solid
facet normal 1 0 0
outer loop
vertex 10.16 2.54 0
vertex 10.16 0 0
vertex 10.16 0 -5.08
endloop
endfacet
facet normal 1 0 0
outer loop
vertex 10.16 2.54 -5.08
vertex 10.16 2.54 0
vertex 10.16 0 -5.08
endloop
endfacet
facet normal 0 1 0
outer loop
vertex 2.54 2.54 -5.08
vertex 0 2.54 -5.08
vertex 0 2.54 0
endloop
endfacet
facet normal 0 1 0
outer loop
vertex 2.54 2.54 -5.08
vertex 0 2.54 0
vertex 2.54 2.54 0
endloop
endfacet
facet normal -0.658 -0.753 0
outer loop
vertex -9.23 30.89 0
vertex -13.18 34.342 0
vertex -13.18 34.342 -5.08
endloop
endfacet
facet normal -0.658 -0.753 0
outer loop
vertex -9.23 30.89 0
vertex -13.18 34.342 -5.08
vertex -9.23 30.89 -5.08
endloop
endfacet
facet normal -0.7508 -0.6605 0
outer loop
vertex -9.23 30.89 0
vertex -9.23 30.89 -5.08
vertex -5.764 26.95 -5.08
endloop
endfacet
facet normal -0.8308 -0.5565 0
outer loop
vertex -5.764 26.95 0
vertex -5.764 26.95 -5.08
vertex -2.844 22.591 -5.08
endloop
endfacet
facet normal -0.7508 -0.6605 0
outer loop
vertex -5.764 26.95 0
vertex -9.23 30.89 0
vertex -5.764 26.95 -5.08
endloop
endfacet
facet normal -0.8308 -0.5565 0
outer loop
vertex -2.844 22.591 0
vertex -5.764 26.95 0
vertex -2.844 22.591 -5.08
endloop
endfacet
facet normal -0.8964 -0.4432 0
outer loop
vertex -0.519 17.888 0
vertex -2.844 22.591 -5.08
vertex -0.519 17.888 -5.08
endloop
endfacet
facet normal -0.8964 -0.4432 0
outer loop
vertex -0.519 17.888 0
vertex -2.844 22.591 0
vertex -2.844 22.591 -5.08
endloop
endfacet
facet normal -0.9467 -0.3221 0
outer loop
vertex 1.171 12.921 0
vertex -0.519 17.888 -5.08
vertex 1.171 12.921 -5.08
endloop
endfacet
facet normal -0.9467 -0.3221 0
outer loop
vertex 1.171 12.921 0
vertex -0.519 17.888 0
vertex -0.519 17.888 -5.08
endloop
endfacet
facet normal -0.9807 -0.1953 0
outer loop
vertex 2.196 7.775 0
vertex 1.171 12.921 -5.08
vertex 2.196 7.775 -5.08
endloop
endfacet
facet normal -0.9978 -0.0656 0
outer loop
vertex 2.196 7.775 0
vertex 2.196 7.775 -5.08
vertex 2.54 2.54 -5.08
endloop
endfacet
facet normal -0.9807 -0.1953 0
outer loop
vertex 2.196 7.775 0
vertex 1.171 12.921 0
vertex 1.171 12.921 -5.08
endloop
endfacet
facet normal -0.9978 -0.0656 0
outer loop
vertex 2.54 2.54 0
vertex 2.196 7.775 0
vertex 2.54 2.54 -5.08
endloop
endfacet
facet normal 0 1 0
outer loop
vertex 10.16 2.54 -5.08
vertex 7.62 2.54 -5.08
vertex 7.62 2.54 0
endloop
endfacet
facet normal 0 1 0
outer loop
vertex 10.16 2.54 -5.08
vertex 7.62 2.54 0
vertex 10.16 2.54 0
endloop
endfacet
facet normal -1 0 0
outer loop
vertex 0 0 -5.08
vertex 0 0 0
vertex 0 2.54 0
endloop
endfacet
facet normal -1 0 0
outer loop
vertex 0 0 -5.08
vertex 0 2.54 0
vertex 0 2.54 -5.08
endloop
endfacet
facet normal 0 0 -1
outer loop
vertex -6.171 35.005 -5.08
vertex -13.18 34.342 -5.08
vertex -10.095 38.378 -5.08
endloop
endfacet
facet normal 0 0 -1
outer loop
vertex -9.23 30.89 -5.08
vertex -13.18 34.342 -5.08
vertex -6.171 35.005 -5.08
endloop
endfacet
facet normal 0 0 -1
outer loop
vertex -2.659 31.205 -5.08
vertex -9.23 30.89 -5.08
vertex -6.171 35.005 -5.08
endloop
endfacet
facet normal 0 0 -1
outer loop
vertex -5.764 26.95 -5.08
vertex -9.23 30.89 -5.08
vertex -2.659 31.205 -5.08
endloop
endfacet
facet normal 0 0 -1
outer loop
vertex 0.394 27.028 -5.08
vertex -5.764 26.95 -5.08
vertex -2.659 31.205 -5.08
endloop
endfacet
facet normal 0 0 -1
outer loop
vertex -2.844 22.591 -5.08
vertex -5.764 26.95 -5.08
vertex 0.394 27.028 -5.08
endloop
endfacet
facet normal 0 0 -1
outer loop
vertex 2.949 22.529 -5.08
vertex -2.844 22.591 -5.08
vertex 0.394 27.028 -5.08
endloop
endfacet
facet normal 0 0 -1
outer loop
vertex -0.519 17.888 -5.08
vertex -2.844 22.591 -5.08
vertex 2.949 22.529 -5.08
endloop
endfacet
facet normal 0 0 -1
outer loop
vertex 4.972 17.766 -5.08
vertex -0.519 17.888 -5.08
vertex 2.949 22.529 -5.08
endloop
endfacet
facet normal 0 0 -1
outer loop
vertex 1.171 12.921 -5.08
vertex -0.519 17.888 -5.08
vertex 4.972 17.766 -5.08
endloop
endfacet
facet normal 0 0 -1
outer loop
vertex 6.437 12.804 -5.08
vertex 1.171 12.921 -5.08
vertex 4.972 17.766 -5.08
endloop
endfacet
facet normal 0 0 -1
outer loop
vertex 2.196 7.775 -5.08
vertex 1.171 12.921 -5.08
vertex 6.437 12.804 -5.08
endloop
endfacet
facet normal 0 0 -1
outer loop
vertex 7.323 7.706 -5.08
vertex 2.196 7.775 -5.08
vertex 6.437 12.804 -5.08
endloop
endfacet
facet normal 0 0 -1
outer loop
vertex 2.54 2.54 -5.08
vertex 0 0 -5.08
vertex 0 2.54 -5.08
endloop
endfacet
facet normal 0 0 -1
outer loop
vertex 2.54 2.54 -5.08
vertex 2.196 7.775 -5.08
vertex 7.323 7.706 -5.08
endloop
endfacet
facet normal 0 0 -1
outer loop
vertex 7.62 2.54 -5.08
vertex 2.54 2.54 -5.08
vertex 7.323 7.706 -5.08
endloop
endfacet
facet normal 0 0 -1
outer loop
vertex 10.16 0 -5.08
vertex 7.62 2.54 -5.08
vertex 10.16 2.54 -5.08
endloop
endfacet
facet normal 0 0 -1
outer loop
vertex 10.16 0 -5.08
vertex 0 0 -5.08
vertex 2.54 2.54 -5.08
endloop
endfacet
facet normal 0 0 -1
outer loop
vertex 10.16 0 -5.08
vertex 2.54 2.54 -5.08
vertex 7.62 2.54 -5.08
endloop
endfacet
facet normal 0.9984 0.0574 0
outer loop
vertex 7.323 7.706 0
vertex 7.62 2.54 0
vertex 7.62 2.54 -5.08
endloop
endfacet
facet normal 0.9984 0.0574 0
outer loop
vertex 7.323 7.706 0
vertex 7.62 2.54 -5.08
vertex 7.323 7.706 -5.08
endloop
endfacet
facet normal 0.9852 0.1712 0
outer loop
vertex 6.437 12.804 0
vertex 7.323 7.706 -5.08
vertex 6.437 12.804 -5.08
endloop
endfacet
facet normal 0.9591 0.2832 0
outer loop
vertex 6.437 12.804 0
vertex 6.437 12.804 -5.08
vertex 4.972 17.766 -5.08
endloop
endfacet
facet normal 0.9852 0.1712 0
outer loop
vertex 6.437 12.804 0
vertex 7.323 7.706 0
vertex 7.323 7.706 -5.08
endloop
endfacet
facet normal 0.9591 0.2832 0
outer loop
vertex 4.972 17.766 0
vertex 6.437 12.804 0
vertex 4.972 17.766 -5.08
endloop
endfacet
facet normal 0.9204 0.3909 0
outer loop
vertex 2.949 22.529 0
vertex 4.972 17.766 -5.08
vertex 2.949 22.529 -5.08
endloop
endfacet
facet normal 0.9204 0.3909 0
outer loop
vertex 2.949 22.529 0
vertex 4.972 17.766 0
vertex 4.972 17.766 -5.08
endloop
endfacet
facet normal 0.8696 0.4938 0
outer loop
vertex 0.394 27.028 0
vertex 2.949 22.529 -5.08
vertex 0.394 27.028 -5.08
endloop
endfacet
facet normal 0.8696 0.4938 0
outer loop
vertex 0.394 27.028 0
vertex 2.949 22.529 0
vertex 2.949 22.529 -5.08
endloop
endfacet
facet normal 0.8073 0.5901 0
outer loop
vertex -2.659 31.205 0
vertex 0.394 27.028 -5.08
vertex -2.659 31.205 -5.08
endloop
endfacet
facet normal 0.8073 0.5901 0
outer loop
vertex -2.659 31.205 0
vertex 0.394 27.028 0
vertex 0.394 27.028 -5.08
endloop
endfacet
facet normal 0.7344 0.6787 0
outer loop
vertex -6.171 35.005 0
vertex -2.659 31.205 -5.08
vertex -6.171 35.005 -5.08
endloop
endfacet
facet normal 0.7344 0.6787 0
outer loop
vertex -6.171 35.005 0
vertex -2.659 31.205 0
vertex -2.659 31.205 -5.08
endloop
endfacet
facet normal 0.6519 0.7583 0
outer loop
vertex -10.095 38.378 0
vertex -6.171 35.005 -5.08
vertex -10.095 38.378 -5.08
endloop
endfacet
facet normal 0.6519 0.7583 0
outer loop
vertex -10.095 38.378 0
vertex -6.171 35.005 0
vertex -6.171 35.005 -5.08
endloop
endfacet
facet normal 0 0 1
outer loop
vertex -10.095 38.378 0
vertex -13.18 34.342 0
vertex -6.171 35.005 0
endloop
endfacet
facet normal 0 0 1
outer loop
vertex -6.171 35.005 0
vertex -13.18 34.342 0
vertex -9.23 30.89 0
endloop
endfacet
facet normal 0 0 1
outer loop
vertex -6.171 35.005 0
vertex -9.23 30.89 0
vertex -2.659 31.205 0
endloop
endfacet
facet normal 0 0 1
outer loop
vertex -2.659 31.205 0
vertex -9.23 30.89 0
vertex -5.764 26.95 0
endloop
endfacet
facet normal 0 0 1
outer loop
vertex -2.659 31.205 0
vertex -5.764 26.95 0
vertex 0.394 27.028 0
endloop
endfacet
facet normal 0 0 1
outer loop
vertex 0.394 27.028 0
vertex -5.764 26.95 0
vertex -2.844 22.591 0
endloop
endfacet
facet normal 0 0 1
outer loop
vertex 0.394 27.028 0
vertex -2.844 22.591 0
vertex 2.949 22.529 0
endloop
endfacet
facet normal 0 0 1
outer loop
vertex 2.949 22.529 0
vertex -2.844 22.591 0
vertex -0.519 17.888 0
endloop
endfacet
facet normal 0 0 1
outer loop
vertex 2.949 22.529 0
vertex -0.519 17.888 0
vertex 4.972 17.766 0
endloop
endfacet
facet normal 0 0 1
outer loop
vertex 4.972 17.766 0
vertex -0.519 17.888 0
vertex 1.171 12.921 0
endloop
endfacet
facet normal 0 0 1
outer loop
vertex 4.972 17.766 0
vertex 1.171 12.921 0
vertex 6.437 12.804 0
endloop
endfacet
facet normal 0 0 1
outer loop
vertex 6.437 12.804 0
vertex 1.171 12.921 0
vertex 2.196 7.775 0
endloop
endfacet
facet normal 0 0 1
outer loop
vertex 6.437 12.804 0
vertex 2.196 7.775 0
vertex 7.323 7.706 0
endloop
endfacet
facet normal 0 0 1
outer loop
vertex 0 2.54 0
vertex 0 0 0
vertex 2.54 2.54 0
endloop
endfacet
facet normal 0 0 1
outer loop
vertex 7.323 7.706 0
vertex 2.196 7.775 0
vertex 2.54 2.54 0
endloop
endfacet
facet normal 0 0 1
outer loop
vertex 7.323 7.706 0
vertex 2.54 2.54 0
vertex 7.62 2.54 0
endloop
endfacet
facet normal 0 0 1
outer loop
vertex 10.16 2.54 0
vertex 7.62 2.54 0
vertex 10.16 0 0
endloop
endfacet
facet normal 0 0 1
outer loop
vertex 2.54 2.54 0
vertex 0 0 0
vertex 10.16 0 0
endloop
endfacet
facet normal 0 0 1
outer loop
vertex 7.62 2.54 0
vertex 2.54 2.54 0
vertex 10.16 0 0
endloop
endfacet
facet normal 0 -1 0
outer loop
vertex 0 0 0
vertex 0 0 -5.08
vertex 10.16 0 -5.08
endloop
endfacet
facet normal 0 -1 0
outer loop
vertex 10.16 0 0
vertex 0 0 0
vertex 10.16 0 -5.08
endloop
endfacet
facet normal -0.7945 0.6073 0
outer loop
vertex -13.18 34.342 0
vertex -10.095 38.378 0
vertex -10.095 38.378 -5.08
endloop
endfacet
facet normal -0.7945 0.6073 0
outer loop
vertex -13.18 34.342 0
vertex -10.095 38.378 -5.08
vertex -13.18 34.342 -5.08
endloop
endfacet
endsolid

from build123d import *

# Parameters (mm, degrees)
SKETCH1_W           = 10.16
SKETCH1_H           = 5.08
BOSS_EXTRUDE1_DEPTH = 2.54
EXTRUDE_THIN1_DEPTH = 5.08


with BuildPart() as part:
    # Sketch1 → Boss-Extrude1 (new body)
    with BuildSketch(Plane(origin=(0, 0, 0), x_dir=(1, 0, 0), z_dir=(0, 1, 0))):
        with Locations((5.08, 2.54)):
            Rectangle(SKETCH1_W, SKETCH1_H)
    extrude(amount=BOSS_EXTRUDE1_DEPTH)

    # Sketch4 → Extrude-Thin1 (add)
    with BuildSketch(Plane(origin=(0, 0, 0), x_dir=(-1, 0, 0), z_dir=(0, 0, -1))):
        with BuildLine():
            ThreePointArc((-7.62, 2.54), (-2.949354511, 22.528719629), (10.095343756, 38.378000016))
            Line((10.095343756, 38.378000016), (13.180251735, 34.341944669))
            ThreePointArc((13.180251735, 34.341944669), (1.604640029, 20.277601299), (-2.54, 2.54))
            Line((-2.54, 2.54), (-7.62, 2.54))
        make_face()
    extrude(amount=EXTRUDE_THIN1_DEPTH)


solid = part.part
